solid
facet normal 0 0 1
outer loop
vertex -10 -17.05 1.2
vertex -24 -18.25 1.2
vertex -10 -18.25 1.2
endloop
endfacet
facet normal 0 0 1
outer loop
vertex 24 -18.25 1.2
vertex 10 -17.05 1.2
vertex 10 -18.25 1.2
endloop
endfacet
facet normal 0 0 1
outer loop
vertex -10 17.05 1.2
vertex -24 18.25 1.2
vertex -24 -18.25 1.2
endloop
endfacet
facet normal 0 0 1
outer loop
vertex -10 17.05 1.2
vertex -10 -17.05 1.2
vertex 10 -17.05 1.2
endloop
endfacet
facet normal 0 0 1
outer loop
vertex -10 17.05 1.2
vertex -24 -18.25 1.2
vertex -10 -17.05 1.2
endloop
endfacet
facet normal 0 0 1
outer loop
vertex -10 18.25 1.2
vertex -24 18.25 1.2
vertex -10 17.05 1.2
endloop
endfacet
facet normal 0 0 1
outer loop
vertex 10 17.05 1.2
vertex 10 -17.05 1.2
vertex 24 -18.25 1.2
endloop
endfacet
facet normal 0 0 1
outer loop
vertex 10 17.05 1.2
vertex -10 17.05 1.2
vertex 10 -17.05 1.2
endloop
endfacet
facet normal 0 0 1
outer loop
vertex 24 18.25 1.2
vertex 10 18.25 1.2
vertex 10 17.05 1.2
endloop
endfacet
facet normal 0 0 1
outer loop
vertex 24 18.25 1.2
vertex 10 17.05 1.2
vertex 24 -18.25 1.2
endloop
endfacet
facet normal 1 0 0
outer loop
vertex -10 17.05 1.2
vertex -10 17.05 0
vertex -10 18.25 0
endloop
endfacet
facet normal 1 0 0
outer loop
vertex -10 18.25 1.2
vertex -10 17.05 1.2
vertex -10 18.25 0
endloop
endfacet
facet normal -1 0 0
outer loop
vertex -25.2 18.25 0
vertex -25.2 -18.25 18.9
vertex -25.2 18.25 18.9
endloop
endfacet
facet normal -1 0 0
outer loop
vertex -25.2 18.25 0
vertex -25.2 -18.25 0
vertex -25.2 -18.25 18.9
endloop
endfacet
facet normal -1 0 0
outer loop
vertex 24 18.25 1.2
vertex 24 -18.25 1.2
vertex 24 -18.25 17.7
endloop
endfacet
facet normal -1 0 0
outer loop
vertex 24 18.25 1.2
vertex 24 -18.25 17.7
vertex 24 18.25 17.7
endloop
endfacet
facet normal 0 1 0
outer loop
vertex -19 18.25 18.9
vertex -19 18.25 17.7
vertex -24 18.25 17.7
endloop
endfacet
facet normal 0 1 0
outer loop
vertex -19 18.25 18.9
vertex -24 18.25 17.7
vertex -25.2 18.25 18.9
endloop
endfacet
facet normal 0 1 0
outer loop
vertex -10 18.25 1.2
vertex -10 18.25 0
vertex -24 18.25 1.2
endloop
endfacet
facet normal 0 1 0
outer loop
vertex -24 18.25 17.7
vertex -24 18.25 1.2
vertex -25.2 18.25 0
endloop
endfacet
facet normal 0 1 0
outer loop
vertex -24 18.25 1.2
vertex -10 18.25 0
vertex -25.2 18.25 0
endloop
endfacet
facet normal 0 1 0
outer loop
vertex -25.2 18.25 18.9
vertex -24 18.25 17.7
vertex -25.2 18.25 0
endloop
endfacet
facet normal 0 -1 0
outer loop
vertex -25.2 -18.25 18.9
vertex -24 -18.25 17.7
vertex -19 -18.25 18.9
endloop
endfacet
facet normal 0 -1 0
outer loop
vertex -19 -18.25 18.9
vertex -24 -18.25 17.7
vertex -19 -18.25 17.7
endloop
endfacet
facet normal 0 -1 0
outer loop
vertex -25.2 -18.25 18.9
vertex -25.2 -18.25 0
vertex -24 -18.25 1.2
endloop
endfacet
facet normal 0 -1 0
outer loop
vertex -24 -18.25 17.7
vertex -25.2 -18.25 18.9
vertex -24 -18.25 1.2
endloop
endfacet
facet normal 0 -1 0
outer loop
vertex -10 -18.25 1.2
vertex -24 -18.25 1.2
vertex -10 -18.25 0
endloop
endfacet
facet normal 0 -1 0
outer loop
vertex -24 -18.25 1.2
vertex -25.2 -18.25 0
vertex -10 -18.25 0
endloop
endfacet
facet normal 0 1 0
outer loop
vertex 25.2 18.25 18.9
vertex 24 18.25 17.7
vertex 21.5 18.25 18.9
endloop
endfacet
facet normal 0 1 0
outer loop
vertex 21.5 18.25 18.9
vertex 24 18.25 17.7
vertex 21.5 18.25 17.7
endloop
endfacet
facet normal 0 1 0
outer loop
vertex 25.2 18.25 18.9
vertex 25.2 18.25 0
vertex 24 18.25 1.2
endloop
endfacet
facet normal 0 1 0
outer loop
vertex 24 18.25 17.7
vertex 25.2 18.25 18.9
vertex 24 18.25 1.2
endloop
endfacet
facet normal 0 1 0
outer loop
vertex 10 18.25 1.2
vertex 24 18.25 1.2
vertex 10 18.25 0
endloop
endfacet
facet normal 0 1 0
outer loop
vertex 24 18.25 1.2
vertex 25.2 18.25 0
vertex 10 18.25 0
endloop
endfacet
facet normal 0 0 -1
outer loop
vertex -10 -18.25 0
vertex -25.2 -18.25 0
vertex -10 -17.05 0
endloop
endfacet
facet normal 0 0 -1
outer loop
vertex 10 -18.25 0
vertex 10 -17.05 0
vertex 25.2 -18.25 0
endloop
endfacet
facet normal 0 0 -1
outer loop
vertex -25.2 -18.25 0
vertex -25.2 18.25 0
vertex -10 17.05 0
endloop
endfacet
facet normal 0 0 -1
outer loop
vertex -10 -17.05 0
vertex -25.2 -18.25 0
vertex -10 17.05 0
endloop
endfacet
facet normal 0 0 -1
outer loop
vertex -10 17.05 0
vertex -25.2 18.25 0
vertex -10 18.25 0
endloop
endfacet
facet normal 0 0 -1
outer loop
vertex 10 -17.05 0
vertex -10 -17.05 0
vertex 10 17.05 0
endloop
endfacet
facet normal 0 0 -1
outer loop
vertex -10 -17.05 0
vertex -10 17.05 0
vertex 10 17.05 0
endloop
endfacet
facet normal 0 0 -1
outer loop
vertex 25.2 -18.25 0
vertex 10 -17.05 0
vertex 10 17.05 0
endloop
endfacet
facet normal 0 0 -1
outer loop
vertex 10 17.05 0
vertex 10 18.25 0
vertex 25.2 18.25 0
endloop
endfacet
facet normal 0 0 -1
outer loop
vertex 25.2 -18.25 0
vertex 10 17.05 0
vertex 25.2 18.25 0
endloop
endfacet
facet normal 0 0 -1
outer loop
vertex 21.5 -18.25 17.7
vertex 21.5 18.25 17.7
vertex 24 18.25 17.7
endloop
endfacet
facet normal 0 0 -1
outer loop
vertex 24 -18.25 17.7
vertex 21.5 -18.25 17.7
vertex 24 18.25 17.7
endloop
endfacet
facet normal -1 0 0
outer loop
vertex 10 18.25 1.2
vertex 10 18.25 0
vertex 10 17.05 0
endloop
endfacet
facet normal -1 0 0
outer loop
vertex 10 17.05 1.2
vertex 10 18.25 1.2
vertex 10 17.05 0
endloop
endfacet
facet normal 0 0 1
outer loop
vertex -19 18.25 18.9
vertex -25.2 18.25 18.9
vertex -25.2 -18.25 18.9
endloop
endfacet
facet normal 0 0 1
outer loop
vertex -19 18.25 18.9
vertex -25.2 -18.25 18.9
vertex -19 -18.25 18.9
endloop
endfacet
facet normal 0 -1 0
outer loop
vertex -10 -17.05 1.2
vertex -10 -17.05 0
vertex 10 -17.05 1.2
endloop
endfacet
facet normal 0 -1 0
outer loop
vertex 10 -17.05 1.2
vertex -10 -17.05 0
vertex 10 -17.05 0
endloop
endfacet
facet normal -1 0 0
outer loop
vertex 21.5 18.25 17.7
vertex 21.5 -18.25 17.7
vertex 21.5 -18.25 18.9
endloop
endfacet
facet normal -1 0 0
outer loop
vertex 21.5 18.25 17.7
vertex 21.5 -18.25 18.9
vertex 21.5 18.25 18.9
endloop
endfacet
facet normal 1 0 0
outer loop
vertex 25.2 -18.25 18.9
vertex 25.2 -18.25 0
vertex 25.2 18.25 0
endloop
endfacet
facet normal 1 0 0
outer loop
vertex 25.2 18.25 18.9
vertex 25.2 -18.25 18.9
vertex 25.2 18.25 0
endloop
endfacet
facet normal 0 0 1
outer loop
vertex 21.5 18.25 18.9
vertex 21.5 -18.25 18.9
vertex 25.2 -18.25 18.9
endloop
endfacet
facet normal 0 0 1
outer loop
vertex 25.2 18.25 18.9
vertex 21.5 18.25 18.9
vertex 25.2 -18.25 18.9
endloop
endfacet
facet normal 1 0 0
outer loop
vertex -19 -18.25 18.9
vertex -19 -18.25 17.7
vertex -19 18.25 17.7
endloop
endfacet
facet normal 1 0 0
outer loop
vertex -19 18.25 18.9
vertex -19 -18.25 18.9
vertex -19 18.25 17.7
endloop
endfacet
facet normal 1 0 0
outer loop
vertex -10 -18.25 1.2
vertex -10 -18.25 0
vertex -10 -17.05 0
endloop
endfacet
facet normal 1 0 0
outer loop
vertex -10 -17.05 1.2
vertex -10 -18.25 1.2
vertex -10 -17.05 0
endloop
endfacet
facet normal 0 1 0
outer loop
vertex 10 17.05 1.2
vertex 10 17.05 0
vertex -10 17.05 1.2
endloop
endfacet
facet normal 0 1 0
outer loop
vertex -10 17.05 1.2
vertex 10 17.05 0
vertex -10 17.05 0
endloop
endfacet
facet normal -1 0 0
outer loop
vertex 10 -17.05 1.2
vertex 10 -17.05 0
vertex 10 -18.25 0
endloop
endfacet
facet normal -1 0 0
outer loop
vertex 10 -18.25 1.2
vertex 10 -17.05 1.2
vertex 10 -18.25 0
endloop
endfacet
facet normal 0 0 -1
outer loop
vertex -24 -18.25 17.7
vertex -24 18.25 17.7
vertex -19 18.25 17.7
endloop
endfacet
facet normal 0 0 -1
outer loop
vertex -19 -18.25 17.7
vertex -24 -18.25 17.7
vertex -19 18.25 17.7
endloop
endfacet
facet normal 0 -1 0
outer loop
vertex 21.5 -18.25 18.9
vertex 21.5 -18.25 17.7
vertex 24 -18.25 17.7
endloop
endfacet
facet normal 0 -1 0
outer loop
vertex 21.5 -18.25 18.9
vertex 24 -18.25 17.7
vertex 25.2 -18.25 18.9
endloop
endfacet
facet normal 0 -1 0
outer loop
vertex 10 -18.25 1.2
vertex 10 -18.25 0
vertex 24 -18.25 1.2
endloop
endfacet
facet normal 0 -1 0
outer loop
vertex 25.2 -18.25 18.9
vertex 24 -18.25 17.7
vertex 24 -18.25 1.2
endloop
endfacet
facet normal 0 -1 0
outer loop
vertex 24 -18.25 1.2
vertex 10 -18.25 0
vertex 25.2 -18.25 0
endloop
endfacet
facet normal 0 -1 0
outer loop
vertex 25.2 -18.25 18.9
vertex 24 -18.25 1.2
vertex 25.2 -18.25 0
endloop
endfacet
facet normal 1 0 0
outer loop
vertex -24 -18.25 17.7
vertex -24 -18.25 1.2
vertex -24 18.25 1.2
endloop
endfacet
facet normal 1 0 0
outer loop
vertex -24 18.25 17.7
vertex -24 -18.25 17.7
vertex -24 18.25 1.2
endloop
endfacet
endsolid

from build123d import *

# Parameters (mm, degrees)
F1_DEPTH = 1.2
F0_W     = 1.2
F0_H     = 36.5
F2_DEPTH = 17.7
F3_W     = 1.2
F3_H     = 36.5
F3_W_2   = 5
F3_W_3   = 3.7
F4_DEPTH = 1.2


with BuildPart() as f1:
    # F0 (on Top) → F1 (new body)
    with BuildSketch(Plane.XY):
        Polygon((10, -18.25), (24, -18.25), (24, 18.25), (10, 18.25), (10, 17.05), (-10, 17.05), (-10, 18.25), (-24, 18.25), (-24, -18.25), (-10, -18.25), (-10, -17.05), (10, -17.05), align=None)
    extrude(amount=F1_DEPTH)

    # F0 (on Top) → F2 (join)
    with BuildSketch(Plane.XY):
        with Locations((-24.6, 0)):
            Rectangle(F0_W, F0_H)
        with Locations((24.6, 0)):
            Rectangle(F0_W, F0_H)
    extrude(amount=F2_DEPTH)

    # F3 (on face) → F4 (join)
    with BuildSketch(Plane.XY.offset(17.7)):
        with Locations((-24.6, 0)):
            Rectangle(F3_W, F3_H)
        with Locations((-21.5, 0)):
            Rectangle(F3_W_2, F3_H)
        with Locations((23.35, 0)):
            Rectangle(F3_W_3, F3_H)
    extrude(amount=F4_DEPTH)


solid = f1.part
